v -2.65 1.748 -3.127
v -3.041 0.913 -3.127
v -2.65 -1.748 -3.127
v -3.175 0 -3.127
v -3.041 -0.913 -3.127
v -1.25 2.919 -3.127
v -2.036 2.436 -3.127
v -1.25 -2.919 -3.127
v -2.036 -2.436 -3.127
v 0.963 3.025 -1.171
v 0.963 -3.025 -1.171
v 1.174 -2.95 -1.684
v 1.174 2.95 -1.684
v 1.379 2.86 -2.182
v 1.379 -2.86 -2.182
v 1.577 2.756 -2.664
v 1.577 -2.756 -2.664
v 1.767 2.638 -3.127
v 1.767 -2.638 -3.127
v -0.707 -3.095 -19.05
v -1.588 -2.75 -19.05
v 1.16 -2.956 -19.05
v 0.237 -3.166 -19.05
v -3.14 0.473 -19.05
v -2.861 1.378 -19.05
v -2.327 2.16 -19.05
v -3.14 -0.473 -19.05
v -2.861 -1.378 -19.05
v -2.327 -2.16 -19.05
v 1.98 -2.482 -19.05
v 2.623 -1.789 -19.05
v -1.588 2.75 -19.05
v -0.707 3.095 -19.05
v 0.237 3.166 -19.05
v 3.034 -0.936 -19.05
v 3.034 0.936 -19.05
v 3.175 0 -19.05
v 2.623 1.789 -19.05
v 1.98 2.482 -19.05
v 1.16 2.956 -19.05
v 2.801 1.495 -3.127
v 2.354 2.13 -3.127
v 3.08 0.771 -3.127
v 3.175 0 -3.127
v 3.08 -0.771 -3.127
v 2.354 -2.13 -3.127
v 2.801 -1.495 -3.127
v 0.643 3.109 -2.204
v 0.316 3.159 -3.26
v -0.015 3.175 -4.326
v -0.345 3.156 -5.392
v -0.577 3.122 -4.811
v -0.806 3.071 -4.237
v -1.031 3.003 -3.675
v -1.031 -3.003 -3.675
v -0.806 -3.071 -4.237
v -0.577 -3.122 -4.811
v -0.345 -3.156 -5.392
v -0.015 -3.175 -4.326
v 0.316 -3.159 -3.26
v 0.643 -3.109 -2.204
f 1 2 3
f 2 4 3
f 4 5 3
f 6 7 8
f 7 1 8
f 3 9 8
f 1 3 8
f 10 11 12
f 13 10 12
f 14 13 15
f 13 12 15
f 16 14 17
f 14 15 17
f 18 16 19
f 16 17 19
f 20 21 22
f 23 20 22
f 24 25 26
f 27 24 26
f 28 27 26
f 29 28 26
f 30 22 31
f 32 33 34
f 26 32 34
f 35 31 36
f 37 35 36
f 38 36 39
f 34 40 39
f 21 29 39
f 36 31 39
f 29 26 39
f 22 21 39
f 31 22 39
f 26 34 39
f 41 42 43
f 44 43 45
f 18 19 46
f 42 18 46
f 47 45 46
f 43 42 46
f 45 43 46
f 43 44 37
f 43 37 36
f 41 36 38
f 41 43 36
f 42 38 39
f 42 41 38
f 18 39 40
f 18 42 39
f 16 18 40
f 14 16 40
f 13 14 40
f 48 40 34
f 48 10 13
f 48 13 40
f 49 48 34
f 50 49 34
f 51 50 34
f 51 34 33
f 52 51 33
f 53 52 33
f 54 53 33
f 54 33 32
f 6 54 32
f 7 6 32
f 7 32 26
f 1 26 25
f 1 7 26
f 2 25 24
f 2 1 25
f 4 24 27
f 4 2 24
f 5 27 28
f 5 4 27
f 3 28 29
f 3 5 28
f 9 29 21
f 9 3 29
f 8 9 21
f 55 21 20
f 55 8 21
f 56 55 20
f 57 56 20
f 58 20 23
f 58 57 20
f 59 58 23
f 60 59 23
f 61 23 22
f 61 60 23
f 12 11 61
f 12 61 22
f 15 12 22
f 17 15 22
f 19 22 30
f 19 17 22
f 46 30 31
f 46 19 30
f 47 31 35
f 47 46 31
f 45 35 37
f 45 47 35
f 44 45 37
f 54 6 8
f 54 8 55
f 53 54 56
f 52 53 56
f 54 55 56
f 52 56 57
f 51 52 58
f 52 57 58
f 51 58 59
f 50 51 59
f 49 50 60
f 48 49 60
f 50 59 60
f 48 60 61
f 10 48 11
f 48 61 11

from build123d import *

# Parameters (mm, degrees)
F0_R     = 3.175
F1_DEPTH = 19.05
F3_DEPTH = 12.7


with BuildPart() as f1:
    # F0 (on Top) → F1 (new body)
    with BuildSketch(Plane.XY):
        Circle(F0_R)
    extrude(amount=-F1_DEPTH)

    # F2 (on Front) → F3 (cut, symmetric)
    with BuildSketch(Plane.XZ):
        Polygon((3.41024, 0.097258), (-3.577343, 0.097258), (-3.577343, -3.126712), (-1.249831, -3.126712), (-0.344881, -5.392152), (0.963141, -1.171422), (1.7667, -3.126712), (3.502352, -3.126712), align=None)
    extrude(amount=F3_DEPTH, both=True, mode=Mode.SUBTRACT)


solid = f1.part
